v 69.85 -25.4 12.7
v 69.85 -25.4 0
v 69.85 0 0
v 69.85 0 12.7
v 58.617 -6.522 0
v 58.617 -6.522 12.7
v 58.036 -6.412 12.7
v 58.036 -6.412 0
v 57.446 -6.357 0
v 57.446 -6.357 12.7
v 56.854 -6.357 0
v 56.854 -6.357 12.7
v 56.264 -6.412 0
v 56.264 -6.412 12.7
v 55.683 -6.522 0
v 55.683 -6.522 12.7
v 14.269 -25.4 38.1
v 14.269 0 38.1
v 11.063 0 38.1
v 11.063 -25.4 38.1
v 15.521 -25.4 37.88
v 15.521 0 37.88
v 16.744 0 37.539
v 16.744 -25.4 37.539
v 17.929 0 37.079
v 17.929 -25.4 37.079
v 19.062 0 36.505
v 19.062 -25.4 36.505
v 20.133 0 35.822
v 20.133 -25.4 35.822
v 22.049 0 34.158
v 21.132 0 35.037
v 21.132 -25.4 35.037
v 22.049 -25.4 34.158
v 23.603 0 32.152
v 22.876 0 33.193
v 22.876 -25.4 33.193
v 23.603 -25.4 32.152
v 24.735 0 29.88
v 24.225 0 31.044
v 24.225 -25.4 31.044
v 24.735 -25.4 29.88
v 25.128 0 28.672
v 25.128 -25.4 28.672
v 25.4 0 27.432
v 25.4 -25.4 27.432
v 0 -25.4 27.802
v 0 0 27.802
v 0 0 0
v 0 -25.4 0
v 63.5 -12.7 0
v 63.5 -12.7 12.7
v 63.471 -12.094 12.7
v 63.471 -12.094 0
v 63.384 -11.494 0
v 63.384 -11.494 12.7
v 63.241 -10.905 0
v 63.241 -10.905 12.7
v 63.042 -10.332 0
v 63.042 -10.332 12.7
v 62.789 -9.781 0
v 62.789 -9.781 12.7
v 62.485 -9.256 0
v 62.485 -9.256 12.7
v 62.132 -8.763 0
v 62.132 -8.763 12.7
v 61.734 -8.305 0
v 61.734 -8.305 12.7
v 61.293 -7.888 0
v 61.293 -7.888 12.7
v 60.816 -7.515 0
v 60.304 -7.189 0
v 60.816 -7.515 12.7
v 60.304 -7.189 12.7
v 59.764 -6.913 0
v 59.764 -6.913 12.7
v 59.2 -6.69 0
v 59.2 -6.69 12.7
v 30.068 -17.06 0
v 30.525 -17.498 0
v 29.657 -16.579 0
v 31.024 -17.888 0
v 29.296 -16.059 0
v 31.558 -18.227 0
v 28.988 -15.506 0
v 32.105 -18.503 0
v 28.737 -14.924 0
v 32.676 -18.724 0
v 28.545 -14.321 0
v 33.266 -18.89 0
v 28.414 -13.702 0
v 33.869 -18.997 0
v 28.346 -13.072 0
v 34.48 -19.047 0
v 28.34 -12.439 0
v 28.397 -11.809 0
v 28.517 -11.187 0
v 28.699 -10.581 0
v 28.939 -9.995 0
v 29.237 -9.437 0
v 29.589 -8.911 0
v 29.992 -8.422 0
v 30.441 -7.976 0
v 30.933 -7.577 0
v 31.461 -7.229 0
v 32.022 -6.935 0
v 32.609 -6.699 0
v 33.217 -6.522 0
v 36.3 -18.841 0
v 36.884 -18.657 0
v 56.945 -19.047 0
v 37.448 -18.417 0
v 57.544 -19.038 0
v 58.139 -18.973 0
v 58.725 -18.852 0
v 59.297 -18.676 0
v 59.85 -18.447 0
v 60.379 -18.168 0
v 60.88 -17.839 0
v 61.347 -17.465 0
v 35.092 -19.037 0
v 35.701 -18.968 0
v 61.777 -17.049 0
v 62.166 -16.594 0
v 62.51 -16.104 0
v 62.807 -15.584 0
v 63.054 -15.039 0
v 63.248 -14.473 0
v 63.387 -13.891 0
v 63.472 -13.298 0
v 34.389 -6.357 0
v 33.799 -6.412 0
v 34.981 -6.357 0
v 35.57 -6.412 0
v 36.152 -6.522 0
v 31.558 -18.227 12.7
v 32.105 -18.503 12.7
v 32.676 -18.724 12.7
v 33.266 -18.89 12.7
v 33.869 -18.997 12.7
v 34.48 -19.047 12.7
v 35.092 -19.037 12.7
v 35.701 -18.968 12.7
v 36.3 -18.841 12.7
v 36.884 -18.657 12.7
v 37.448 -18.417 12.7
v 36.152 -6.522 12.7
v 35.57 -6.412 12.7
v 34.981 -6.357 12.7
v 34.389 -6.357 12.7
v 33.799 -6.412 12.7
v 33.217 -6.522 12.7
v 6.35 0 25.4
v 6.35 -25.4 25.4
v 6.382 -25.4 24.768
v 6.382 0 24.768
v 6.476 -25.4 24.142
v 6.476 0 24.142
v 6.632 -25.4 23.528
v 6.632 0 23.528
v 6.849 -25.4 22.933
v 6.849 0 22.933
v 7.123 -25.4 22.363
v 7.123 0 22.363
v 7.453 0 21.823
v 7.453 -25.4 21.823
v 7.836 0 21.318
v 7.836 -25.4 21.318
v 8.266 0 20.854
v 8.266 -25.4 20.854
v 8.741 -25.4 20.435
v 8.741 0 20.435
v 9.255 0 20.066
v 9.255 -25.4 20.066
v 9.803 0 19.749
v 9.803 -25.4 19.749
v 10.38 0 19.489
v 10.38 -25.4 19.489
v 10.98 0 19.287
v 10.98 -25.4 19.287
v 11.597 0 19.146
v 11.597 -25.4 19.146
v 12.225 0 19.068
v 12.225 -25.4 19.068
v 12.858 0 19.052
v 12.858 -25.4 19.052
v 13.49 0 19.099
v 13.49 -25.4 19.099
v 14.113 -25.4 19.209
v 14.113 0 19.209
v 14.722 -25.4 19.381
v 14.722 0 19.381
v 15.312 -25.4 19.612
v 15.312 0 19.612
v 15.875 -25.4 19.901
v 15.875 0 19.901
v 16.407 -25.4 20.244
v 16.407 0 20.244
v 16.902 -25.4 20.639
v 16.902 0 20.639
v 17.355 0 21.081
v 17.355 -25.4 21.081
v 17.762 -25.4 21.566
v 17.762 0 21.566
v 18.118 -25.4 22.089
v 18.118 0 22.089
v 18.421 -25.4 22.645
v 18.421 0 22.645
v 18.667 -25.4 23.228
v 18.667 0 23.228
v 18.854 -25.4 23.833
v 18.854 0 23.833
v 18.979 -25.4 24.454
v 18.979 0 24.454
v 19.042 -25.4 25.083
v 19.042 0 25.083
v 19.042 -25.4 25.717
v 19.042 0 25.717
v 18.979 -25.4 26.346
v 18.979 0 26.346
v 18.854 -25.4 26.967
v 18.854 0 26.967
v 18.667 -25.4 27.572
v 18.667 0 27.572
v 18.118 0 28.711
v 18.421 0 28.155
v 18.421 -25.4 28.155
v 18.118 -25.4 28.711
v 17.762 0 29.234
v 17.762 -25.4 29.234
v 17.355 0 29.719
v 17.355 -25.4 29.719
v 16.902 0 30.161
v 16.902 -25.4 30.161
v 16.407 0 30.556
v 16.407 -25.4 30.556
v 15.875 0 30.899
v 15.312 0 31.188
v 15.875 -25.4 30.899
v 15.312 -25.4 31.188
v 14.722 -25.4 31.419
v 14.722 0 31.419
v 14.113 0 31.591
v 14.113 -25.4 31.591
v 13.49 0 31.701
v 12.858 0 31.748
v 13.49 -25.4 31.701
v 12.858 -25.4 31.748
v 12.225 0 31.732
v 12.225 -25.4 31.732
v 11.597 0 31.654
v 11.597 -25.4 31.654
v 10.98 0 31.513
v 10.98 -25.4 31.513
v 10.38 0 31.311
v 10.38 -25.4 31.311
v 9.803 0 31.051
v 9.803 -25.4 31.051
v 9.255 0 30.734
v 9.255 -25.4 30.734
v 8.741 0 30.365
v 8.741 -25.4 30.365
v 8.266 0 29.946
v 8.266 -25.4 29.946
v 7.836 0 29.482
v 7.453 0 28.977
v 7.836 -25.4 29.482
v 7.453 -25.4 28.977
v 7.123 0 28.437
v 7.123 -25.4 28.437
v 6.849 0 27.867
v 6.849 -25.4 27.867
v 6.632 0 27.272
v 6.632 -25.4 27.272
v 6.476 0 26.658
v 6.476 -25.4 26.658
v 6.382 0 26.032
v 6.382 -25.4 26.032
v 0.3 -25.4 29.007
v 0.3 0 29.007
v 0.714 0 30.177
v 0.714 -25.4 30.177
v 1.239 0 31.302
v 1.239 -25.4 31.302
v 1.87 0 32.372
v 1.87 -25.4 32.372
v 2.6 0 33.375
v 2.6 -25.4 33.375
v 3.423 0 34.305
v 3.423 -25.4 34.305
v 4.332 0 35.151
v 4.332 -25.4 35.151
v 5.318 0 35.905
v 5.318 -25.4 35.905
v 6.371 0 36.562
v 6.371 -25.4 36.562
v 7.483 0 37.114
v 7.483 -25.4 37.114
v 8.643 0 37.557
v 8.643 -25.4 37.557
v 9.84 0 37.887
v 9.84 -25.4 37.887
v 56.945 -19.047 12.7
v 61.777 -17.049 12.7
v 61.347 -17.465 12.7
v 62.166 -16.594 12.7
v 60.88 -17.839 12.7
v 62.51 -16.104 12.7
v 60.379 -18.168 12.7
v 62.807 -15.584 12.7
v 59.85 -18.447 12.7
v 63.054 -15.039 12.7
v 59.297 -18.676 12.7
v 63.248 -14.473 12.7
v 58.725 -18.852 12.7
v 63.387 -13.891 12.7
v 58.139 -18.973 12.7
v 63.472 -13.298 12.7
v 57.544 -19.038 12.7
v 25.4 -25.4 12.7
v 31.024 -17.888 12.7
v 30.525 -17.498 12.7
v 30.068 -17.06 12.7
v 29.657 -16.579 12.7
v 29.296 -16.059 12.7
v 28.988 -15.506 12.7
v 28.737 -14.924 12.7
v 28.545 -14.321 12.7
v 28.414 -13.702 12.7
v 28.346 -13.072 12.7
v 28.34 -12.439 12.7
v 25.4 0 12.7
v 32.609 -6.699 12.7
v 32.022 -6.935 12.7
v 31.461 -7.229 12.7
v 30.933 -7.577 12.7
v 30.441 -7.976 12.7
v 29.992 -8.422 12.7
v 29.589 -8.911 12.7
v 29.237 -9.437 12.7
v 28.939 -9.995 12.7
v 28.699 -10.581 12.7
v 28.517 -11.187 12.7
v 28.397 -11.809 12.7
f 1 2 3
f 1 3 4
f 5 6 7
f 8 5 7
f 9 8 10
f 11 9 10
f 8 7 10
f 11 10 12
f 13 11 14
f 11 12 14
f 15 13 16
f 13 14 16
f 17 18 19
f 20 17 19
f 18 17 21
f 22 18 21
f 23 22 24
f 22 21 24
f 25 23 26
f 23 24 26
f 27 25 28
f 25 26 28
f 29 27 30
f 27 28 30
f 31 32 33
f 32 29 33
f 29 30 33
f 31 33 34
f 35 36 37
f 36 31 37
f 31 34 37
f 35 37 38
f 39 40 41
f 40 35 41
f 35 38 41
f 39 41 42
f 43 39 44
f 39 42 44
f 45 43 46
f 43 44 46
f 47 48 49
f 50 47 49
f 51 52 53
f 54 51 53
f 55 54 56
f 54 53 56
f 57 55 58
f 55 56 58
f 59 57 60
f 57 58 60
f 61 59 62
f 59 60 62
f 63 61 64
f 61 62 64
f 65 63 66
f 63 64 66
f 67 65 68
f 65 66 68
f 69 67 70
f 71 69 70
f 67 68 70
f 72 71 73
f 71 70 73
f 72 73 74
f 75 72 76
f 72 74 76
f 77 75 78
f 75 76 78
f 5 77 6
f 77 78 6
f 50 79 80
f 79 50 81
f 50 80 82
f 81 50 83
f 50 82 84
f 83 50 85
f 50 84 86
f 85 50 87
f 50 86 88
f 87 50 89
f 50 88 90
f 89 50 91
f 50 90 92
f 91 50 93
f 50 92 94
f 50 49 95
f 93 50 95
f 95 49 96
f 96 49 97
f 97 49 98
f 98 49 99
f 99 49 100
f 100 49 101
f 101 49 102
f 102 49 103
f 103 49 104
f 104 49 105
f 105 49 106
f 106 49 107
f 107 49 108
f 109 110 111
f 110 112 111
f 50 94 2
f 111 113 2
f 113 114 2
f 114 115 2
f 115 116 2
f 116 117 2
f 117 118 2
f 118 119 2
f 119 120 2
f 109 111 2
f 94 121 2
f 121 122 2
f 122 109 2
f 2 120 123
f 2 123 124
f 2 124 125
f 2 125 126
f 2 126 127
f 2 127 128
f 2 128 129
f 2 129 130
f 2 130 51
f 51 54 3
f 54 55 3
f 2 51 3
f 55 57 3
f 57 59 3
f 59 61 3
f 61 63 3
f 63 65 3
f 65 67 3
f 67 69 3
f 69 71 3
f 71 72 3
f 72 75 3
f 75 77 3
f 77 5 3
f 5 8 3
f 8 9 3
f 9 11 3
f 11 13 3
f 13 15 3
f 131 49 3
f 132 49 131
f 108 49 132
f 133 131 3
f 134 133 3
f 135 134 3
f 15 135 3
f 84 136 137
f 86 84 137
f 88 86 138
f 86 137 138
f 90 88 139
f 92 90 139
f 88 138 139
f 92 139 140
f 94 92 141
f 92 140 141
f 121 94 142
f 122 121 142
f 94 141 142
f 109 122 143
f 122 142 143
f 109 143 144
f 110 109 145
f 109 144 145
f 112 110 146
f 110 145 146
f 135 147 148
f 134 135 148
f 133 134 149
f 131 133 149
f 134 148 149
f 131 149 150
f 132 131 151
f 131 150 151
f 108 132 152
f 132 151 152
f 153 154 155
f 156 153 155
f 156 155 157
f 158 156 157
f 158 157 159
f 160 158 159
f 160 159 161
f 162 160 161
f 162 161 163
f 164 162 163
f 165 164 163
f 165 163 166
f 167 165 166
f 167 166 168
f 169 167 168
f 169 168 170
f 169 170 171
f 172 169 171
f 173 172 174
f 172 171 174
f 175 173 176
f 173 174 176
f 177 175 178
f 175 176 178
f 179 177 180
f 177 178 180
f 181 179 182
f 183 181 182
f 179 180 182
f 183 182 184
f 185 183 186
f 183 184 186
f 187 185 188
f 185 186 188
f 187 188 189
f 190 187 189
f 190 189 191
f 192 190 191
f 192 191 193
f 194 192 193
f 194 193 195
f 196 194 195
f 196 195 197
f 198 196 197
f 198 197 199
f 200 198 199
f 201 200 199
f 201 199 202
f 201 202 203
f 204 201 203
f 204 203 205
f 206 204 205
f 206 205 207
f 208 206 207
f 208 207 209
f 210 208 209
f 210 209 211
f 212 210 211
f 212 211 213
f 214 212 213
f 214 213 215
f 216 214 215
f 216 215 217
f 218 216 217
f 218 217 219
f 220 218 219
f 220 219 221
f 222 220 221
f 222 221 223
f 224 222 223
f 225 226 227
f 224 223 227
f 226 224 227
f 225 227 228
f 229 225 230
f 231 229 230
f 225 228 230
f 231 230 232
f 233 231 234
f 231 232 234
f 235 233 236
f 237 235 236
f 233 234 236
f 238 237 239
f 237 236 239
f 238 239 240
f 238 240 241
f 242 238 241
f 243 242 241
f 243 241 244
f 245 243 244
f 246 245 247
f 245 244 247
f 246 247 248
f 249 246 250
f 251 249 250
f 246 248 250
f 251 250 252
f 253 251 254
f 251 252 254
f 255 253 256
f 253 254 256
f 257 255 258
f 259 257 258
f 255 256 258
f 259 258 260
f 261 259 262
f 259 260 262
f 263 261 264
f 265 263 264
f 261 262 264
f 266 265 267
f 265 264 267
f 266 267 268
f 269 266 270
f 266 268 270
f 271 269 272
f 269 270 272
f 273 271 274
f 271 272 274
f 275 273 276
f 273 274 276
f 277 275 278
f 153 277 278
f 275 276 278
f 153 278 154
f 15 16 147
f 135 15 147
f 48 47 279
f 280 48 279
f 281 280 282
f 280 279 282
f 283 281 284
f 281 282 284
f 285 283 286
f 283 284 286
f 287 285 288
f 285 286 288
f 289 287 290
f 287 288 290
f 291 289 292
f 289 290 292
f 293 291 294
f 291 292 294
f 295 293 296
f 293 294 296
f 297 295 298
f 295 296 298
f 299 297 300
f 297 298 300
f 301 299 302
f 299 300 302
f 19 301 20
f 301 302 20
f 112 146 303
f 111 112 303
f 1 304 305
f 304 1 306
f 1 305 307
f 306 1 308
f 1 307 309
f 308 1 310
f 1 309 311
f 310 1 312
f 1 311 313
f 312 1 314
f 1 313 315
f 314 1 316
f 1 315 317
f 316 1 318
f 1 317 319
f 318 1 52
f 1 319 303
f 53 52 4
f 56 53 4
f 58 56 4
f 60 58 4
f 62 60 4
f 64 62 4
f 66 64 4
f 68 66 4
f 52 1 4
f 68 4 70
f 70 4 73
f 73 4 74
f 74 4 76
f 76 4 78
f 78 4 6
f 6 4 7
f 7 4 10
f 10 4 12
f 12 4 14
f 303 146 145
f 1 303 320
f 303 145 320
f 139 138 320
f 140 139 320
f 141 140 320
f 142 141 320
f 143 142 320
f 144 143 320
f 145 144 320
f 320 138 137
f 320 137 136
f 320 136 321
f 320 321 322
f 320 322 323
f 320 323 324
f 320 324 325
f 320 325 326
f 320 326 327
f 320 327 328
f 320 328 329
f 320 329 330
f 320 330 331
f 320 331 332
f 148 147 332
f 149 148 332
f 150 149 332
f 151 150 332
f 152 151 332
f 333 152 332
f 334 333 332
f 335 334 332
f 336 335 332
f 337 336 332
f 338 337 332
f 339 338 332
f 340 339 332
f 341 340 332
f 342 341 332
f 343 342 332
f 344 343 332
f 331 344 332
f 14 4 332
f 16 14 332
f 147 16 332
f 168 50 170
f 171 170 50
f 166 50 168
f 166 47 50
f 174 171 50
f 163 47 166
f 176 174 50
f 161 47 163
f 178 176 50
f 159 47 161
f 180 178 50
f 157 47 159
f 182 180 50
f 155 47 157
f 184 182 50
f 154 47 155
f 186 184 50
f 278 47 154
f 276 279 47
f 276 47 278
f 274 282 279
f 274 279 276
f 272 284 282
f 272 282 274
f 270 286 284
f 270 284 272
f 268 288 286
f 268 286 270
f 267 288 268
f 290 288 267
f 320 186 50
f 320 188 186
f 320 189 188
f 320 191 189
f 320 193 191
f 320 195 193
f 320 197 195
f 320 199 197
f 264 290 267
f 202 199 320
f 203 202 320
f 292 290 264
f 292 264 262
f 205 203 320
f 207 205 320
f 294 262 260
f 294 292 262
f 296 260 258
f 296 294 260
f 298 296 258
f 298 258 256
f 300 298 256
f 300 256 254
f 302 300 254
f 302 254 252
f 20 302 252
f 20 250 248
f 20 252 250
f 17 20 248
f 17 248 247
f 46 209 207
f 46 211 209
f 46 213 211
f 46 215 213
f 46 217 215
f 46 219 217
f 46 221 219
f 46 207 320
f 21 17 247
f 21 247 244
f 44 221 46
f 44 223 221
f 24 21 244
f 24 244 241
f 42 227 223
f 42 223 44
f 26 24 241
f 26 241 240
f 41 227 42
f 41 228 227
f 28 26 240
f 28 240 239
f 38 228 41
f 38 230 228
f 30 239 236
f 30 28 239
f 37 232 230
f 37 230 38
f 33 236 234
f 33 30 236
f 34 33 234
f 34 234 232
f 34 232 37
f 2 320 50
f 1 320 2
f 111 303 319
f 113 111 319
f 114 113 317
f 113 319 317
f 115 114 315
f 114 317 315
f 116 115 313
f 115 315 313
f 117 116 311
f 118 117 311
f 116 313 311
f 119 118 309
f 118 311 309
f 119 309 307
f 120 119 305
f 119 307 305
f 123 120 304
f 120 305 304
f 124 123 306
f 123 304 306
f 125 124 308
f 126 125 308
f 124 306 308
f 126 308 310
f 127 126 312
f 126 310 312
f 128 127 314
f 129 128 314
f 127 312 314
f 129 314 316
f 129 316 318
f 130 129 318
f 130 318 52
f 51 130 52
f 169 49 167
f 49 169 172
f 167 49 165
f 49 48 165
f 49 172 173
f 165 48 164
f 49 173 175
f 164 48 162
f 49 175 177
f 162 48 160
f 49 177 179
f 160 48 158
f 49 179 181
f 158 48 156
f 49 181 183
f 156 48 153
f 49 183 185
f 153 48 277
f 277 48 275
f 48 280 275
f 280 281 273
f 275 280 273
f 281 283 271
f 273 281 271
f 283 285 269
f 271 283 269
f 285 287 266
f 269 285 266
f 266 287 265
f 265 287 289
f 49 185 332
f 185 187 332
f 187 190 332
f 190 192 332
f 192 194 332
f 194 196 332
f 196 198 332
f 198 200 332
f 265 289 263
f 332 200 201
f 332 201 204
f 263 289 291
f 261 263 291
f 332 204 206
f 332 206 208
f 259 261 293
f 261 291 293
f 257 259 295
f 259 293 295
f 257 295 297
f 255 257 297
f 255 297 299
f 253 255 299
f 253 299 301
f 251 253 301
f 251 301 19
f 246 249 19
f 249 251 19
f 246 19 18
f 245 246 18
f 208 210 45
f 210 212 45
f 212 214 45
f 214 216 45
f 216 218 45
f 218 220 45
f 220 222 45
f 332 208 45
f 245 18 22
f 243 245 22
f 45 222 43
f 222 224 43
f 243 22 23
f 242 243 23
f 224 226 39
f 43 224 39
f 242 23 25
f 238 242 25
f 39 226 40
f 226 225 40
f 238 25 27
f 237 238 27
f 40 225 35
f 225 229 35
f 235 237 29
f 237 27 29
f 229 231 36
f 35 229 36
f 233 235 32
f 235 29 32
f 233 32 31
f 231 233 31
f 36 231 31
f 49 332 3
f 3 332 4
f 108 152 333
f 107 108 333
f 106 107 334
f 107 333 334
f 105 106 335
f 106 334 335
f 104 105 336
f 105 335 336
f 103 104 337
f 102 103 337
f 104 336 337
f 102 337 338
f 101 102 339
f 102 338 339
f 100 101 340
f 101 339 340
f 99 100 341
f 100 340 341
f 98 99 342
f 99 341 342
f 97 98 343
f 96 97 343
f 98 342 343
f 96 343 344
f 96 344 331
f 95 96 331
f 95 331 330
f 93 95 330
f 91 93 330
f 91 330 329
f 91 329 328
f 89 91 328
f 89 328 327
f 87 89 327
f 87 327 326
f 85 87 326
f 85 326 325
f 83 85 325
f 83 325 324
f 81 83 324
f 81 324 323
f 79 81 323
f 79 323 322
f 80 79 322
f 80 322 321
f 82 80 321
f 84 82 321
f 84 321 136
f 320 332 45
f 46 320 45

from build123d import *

# Parameters (mm, degrees)
F1_DEPTH = 25.4
F3_DEPTH = 25.401
F5_DEPTH = 25.401
F7_DEPTH = 12.701


with BuildPart() as f1:
    # F0 (on Front) → F1 (new body)
    with BuildSketch(Plane.XZ):
        Polygon((25.4, 38.1), (0, 38.1), (0, 0), (69.85, 0), (69.85, 12.7), (25.4, 12.7), align=None)
    extrude(amount=F1_DEPTH)

    # F2 (on face) → F3 (cut, through all)
    with BuildSketch(Plane.XZ.offset(25.4)):
        with BuildLine():
            Line((6.35, 25.4), (19.05, 25.4))
            ThreePointArc((19.05, 25.4), (12.7, 31.75), (6.35, 25.4))
        make_face()
        with BuildLine():
            ThreePointArc((6.35, 25.4), (12.7, 19.05), (19.05, 25.4))
            Line((19.05, 25.4), (6.35, 25.4))
        make_face()
    extrude(amount=-F3_DEPTH, mode=Mode.SUBTRACT)

    # F4 (on face) → F5 (cut, through all)
    with BuildSketch(Plane.XZ.offset(25.4)):
        with BuildLine():
            ThreePointArc((0, 27.8021660134), (3.867394622, 34.7385435521), (11.0625794751, 38.1))
            Line((11.0625794751, 38.1), (0, 38.1))
            Line((0, 38.1), (0, 27.8021660134))
        make_face()
        with BuildLine():
            ThreePointArc((14.2694085859, 38.1), (21.6015748331, 34.6091533391), (25.4, 27.4315048009))
            Line((25.4, 27.4315048009), (25.4, 38.1))
            Line((25.4, 38.1), (14.2694085859, 38.1))
        make_face()
    extrude(amount=-F5_DEPTH, mode=Mode.SUBTRACT)

    # F6 (on face) → F7 (cut, through all)
    with BuildSketch(Plane.XY.offset(12.7)):
        with BuildLine():
            ThreePointArc((56.9451018092, -19.0466933699), (61.5670916047, -17.26199537), (63.5, -12.7))
            ThreePointArc((63.5, -12.7), (62.1319623553, -8.7626720876), (58.6173067433, -6.5218521448))
            Line((58.6173067433, -6.5218521448), (55.6826932567, -6.5218521448))
            ThreePointArc((55.6826932567, -6.5218521448), (50.8320114543, -13.3368051005), (56.9451018092, -19.0466933699))
        make_face()
        with BuildLine():
            Line((55.6826932567, -6.5218521448), (58.6173067433, -6.5218521448))
            ThreePointArc((58.6173067433, -6.5218521448), (57.15, -6.35), (55.6826932567, -6.5218521448))
        make_face()
        with BuildLine():
            Line((37.4478836052, -18.4172404403), (56.9451018092, -19.0466933699))
            ThreePointArc((56.9451018092, -19.0466933699), (50.8320114543, -13.3368051005), (55.6826932567, -6.5218521448))
            Line((55.6826932567, -6.5218521448), (36.1519202299, -6.5218521448))
            ThreePointArc((36.1519202299, -6.5218521448), (39.6665758419, -8.7626720876), (41.0346134866, -12.7))
            ThreePointArc((41.0346134866, -12.7), (40.0637056615, -16.074591438), (37.4478836052, -18.4172404403))
        make_face()
        with BuildLine():
            Line((31.5583283297, -18.2271006068), (37.4478836052, -18.4172404403))
            ThreePointArc((37.4478836052, -18.4172404403), (40.0637056615, -16.074591438), (41.0346134866, -12.7))
            ThreePointArc((41.0346134866, -12.7), (39.6665758419, -8.7626720876), (36.1519202299, -6.5218521448))
            Line((36.1519202299, -6.5218521448), (33.2173067433, -6.5218521448))
            ThreePointArc((33.2173067433, -6.5218521448), (28.3974454416, -11.8089231379), (31.5583283297, -18.2271006068))
        make_face()
        with BuildLine():
            ThreePointArc((31.5583283297, -18.2271006068), (34.4797152958, -19.0466933699), (37.4478836052, -18.4172404403))
            Line((37.4478836052, -18.4172404403), (31.5583283297, -18.2271006068))
        make_face()
        with BuildLine():
            Line((33.2173067433, -6.5218521448), (36.1519202299, -6.5218521448))
            ThreePointArc((36.1519202299, -6.5218521448), (34.6846134866, -6.35), (33.2173067433, -6.5218521448))
        make_face()
    extrude(amount=-F7_DEPTH, mode=Mode.SUBTRACT)


solid = f1.part
